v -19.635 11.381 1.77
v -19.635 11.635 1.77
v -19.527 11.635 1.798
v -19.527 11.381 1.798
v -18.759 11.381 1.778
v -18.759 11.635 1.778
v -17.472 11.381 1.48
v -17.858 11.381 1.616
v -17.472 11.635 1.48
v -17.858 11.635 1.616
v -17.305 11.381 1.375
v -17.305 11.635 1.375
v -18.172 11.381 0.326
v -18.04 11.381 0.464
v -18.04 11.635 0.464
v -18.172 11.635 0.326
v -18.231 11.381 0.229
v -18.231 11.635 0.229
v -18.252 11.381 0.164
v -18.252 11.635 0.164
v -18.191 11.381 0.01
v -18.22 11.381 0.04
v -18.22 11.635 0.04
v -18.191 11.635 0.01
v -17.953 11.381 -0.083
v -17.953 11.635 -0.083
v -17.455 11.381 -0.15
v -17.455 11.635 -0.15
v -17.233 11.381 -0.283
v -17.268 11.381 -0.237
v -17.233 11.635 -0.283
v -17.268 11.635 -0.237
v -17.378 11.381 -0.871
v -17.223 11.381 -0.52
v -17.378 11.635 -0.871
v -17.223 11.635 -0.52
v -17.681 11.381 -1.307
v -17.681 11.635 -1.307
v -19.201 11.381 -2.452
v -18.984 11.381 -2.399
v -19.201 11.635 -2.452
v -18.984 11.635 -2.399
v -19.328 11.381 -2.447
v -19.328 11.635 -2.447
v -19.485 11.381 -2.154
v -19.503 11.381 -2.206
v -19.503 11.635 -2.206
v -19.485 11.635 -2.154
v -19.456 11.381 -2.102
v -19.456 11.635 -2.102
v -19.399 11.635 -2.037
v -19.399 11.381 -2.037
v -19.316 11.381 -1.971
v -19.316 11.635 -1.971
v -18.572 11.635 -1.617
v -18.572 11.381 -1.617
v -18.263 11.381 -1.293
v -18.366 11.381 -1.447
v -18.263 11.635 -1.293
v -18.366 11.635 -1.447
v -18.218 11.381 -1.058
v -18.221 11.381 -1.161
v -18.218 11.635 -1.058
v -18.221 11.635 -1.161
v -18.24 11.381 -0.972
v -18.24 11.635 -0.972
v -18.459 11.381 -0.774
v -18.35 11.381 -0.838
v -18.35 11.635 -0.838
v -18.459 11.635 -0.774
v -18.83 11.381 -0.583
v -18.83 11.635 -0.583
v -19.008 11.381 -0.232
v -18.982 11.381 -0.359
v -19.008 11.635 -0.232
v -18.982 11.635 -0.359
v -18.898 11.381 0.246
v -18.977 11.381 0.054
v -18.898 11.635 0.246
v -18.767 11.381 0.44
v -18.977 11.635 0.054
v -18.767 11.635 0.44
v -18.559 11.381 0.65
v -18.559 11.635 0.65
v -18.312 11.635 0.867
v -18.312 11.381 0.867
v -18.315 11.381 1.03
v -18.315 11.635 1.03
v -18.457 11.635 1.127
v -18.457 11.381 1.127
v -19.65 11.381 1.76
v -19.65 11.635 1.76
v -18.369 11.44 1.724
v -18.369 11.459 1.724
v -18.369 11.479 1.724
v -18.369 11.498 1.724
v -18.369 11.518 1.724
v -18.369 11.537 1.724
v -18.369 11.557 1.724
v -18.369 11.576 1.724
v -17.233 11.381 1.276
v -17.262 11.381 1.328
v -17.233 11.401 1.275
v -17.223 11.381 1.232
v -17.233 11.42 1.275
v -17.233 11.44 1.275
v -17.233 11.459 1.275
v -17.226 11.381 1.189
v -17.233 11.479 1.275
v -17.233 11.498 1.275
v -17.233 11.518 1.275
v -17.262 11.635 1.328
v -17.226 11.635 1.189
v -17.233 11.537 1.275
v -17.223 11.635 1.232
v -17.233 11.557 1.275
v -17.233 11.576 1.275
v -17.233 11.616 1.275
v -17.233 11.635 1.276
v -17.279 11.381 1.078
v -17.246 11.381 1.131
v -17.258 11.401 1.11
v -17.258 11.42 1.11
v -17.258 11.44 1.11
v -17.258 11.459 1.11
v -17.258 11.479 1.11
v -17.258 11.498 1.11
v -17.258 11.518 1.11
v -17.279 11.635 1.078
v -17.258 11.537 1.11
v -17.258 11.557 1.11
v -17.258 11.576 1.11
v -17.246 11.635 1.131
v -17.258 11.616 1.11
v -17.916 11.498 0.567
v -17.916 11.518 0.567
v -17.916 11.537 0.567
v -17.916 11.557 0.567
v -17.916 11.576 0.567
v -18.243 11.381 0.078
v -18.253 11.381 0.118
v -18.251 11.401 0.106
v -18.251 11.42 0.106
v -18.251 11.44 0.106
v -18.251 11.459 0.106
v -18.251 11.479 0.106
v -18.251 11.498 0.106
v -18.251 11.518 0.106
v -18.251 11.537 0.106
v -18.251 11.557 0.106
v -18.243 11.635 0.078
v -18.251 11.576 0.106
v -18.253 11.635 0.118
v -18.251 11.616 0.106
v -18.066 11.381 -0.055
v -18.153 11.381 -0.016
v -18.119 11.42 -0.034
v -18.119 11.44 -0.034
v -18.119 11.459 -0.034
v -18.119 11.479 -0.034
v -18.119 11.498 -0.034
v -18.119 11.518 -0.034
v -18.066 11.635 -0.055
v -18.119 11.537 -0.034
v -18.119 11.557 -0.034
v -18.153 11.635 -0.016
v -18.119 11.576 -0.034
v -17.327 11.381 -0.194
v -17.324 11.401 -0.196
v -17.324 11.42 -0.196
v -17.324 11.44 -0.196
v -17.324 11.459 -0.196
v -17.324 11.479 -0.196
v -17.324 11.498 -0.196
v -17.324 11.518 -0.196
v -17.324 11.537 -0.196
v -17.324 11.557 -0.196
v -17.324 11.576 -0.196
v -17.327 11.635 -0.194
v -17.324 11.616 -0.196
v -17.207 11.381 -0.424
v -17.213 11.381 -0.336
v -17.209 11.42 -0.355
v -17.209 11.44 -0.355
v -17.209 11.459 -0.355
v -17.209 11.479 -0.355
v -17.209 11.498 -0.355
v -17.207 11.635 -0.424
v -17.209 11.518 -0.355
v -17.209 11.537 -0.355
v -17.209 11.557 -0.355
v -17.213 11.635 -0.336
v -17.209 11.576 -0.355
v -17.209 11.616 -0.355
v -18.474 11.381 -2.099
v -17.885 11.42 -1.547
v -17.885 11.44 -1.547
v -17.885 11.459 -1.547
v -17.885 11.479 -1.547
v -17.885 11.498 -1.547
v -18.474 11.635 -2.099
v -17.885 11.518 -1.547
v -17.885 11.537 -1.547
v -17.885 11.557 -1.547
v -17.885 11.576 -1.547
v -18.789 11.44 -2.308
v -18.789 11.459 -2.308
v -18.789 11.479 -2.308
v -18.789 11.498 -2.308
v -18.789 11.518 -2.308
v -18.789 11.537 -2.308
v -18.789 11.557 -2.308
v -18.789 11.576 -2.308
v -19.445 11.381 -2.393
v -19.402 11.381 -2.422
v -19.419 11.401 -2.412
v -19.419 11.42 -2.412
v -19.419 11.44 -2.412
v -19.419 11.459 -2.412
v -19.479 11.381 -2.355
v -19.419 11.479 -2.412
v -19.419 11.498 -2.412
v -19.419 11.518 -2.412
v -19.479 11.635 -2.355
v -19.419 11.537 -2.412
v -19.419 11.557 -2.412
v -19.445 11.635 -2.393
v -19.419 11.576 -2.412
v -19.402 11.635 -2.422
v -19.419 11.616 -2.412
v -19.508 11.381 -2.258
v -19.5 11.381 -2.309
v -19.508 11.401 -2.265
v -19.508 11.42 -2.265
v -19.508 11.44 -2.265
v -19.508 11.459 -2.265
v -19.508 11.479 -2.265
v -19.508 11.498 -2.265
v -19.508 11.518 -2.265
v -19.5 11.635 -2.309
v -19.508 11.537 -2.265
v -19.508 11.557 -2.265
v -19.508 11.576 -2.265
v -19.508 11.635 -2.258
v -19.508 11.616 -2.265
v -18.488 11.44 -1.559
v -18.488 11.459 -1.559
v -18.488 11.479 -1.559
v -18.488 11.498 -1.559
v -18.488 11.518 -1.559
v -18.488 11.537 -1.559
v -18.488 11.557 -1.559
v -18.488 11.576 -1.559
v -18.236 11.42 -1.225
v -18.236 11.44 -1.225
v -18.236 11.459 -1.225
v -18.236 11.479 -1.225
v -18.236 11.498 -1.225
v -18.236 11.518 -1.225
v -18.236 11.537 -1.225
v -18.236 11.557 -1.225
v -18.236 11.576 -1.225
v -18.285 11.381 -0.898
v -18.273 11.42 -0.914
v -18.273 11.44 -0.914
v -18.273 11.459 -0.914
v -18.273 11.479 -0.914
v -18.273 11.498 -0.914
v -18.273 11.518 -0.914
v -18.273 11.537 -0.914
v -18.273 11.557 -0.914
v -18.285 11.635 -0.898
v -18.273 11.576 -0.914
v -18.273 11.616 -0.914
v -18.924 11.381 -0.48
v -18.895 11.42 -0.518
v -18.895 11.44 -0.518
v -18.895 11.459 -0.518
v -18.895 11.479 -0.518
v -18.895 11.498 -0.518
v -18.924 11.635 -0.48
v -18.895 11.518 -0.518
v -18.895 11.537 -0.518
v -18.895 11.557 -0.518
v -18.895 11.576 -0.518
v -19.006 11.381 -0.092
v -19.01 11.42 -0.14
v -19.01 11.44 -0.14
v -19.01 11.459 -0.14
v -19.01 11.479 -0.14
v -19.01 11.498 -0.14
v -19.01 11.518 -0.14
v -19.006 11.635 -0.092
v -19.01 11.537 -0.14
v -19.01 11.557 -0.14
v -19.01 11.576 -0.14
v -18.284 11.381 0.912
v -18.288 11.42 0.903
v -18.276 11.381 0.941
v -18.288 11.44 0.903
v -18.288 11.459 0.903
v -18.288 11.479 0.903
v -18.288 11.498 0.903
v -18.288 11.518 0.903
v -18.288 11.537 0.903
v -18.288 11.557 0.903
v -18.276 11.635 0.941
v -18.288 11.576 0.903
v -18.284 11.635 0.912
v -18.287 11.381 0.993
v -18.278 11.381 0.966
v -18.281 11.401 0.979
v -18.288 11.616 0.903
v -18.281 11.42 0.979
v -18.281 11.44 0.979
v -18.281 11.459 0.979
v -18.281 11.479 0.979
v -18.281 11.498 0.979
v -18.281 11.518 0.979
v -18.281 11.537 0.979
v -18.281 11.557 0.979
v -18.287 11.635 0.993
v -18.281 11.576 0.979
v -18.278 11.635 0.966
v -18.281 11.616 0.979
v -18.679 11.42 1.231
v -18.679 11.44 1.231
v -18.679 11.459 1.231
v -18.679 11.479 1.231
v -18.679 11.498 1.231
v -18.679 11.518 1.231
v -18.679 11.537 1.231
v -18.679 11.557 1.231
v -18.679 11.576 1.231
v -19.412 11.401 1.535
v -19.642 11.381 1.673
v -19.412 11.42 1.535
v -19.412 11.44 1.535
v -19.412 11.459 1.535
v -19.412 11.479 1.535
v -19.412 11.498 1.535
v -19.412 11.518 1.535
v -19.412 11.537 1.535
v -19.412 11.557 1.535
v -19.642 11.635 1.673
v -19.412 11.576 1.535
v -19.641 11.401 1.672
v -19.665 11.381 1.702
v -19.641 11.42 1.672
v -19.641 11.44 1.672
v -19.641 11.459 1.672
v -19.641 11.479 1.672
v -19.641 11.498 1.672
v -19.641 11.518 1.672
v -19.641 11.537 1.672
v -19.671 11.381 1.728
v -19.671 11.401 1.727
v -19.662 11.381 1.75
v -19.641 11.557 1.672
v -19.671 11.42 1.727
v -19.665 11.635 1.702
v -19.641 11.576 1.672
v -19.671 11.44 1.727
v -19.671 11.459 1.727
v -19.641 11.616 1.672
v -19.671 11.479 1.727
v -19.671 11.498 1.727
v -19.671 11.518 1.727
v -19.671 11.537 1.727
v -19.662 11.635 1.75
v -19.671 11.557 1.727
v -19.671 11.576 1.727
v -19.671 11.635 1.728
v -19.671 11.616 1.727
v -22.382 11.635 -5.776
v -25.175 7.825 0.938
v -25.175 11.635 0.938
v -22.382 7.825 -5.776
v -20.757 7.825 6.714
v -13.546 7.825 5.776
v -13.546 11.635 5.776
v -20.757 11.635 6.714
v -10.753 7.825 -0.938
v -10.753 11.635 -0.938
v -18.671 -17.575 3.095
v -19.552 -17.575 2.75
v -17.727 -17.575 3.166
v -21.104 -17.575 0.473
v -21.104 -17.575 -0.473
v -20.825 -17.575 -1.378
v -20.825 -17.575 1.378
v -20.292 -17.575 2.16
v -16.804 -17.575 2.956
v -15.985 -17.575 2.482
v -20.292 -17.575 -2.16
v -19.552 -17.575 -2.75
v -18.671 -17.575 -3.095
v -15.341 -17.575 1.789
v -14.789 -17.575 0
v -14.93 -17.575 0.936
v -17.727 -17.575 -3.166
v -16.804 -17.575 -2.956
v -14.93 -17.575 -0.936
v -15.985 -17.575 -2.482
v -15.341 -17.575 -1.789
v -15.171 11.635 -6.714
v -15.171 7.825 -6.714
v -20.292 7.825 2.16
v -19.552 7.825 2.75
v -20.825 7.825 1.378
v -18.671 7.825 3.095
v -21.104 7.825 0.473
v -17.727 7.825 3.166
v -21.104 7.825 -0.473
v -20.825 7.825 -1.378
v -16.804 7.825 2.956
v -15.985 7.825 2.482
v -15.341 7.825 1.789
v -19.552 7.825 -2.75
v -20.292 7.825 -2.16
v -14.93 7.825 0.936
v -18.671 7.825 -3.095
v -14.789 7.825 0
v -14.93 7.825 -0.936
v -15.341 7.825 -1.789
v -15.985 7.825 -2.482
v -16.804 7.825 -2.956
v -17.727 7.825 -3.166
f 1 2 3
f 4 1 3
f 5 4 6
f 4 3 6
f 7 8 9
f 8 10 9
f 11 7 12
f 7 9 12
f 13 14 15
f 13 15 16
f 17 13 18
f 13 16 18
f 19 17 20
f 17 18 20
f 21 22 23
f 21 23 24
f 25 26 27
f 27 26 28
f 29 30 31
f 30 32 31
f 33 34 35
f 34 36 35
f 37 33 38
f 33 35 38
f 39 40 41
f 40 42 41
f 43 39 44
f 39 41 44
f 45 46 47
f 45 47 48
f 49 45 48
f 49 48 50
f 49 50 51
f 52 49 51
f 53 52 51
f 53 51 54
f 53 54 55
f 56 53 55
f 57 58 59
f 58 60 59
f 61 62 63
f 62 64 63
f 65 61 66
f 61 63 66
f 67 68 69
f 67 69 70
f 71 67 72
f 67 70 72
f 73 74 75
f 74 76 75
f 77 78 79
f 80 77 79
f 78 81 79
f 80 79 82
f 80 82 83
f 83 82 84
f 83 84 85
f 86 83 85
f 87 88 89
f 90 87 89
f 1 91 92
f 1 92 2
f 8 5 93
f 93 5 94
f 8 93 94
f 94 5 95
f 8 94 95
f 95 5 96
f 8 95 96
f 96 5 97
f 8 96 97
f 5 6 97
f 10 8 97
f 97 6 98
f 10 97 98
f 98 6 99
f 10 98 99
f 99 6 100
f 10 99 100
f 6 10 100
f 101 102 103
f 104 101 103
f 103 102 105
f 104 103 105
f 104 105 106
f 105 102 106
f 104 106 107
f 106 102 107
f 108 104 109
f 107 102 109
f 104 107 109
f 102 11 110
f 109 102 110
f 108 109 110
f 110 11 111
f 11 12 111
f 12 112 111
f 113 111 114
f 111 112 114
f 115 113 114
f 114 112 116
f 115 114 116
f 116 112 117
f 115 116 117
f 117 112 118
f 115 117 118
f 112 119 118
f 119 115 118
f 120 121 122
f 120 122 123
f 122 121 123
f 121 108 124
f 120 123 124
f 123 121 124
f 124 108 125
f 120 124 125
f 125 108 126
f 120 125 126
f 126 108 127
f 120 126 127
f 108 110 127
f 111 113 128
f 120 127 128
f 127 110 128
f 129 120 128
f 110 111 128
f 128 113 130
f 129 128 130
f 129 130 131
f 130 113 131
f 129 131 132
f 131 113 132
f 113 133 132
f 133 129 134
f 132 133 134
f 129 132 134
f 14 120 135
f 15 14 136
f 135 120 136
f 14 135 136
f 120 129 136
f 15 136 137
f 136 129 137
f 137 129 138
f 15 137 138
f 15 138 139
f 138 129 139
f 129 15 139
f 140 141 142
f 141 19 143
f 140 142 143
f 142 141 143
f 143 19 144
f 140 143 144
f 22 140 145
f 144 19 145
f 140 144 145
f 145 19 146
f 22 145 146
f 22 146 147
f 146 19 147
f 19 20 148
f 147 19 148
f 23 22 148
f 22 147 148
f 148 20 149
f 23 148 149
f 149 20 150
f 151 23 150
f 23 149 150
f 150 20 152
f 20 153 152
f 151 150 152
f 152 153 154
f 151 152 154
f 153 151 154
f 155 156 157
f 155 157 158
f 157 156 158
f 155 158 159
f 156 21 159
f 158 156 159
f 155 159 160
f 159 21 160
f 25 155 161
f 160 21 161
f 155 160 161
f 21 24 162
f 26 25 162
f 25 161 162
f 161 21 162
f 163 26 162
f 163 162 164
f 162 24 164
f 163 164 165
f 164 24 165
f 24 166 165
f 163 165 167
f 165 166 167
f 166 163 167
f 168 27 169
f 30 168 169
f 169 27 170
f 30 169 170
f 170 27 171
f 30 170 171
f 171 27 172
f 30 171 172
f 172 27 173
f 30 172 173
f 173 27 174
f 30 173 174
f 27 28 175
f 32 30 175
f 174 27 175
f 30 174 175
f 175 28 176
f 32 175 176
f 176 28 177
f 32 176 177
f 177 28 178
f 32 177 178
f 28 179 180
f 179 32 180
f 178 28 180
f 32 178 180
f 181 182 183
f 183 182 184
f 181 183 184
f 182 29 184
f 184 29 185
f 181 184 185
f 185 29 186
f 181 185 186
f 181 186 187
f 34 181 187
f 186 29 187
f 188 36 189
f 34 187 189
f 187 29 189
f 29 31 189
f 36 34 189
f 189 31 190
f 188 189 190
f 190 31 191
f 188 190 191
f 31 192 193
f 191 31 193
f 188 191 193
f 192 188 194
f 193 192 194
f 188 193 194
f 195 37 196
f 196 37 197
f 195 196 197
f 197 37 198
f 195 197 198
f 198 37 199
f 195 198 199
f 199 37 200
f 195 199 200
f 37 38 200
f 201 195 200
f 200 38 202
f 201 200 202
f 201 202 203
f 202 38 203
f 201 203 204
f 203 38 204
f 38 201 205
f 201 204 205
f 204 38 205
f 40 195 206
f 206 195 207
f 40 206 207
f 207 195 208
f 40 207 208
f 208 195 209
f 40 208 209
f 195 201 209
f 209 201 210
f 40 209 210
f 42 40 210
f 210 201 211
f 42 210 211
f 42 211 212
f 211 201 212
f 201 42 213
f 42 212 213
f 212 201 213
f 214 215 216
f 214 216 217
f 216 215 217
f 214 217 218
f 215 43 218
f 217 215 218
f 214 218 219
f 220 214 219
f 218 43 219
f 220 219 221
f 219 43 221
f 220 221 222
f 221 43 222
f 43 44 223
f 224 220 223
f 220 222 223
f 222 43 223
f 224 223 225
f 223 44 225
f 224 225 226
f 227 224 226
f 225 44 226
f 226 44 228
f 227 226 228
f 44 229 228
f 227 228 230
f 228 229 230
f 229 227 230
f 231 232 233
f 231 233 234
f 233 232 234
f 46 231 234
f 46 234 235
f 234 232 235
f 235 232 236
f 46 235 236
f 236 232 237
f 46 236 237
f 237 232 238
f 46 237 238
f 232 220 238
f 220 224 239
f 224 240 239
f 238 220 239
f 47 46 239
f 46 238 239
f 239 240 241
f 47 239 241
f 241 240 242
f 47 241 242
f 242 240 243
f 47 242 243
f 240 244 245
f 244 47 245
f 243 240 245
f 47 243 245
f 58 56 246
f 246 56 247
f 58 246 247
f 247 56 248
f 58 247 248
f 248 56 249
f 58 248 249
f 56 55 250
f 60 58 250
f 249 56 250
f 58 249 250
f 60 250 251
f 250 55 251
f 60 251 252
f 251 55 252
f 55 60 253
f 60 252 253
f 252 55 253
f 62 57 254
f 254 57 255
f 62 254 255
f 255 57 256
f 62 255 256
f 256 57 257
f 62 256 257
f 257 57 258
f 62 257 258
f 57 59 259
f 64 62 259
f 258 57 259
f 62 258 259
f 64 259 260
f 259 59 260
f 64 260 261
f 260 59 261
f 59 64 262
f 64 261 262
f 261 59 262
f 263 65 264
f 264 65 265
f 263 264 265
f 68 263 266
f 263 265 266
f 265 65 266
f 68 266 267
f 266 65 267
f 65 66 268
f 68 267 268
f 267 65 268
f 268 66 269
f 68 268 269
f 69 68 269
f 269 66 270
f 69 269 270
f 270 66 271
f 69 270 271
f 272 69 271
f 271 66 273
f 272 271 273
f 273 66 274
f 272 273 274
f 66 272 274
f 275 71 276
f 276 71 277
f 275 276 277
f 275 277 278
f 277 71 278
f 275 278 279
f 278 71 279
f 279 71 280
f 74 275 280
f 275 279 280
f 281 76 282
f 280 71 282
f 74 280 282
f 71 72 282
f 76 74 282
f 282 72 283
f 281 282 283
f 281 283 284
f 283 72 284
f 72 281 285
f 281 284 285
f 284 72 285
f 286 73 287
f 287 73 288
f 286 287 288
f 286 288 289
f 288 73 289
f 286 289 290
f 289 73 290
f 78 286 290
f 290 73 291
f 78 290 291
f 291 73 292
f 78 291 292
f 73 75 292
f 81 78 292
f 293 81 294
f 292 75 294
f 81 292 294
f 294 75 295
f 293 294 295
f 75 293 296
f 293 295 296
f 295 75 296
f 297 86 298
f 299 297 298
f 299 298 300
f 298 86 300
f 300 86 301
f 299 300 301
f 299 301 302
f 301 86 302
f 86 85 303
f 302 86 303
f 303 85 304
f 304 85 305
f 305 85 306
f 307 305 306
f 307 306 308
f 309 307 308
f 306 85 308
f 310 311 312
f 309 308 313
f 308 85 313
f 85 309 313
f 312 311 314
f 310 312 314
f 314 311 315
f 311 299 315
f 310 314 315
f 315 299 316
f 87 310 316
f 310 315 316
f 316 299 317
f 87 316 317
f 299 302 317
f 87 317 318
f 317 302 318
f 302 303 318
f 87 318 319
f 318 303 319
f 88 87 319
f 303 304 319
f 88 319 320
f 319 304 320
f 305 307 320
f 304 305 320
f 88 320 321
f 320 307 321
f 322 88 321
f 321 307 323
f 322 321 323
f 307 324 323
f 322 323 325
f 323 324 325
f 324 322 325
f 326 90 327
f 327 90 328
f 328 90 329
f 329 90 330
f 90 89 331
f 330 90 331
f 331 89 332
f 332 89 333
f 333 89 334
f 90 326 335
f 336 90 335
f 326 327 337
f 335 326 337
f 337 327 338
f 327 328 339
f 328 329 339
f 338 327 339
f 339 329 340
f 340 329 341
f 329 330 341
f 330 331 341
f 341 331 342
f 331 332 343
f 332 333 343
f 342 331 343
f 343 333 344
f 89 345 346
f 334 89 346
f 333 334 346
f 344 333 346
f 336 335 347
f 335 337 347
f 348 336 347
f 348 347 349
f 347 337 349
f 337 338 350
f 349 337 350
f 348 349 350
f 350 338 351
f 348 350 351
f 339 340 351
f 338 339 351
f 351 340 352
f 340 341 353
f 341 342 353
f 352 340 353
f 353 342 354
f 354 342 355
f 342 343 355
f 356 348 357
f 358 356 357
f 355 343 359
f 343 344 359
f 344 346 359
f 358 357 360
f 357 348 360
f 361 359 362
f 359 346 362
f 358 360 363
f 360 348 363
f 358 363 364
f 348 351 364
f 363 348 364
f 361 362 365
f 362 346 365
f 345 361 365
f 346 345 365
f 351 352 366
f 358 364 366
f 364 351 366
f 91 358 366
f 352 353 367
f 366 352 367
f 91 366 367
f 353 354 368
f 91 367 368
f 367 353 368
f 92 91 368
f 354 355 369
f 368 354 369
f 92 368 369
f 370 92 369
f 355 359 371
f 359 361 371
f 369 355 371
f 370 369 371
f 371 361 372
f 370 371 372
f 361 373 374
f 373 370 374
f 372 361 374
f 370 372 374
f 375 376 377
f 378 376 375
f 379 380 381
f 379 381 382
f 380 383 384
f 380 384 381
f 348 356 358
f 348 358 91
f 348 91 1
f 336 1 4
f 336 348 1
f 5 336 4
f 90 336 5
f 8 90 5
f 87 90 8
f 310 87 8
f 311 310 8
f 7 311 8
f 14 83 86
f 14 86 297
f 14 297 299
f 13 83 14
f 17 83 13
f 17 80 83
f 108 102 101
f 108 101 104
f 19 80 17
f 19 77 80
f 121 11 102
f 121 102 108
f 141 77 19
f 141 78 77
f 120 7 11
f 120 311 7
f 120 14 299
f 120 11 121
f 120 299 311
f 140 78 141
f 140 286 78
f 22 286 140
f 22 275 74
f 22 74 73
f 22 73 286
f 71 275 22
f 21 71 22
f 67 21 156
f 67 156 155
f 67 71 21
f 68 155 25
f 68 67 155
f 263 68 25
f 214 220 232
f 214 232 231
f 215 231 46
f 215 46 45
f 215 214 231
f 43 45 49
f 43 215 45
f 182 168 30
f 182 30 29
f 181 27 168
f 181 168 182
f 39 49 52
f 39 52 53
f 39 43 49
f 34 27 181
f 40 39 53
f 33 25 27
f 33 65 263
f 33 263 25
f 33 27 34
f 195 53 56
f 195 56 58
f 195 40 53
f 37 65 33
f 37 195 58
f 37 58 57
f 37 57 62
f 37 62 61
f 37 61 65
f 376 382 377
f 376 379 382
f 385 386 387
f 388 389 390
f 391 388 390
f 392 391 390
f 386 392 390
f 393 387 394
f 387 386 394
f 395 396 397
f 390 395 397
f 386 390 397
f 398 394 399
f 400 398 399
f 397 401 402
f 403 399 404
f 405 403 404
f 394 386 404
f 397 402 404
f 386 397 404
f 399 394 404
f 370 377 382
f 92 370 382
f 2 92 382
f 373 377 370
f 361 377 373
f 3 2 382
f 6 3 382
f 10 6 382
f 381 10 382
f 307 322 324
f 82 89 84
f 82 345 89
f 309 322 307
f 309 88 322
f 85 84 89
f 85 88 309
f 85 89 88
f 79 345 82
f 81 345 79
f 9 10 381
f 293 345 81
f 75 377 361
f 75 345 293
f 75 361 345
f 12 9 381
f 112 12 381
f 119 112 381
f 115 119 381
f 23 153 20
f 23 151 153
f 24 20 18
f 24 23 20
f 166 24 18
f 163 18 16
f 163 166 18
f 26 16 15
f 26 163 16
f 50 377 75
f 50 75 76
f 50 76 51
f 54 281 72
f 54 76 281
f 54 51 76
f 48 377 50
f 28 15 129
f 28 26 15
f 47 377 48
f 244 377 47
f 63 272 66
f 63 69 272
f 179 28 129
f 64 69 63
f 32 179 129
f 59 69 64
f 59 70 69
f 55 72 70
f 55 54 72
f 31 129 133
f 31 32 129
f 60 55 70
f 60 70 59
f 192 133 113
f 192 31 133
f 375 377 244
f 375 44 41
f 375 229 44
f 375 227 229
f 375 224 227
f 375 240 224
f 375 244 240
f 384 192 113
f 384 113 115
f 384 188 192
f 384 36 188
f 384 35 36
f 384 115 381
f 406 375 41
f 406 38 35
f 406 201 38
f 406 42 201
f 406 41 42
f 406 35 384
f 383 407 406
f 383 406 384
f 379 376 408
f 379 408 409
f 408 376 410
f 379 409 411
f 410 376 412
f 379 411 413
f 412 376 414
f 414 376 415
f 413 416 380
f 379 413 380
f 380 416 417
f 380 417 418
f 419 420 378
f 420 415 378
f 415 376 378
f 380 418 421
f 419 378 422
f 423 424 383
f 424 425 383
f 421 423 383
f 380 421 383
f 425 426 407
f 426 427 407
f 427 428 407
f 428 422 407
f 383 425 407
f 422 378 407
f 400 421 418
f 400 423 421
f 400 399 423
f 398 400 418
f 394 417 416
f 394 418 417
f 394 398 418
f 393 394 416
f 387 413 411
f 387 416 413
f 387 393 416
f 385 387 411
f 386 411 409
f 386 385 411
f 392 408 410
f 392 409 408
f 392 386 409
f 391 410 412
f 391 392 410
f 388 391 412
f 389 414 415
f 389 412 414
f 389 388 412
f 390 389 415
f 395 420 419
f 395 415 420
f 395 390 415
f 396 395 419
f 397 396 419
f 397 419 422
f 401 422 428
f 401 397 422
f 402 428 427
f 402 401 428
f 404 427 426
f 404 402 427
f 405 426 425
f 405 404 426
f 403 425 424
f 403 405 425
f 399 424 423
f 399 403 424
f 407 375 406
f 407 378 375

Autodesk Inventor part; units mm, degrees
ref_plane "YZ Plane" through (0, 0, 0) normal (1, 0, 0) x (0, 1, 0)
ref_plane "XZ Plane" through (0, 0, 0) normal (0, 1, 0) x (-1, 0, 0)
ref_plane "XY Plane" through (0, 0, 0) normal (0, 0, 1) x (1, 0, 0)
sketch "Sketch1" plane through (0, 0, 0) normal (0, 0, 1) x (1, 0, 0)
  line L0 (-17.9641, 7.8251) -> (-14.7891, 7.8251)
  line L1 (-14.7891, 7.8251) -> (-14.7891, -17.5749)
  line L2 (-14.7891, -17.5749) -> (-17.9641, -17.5749)
  line L3 (-17.9641, -17.5749) -> (-17.9641, 7.8251)
  point P0 (0, 0)
  dimension "d0" = 3.175
  dimension "d1" = 25.4
revolve "Revolution1" add sketch "Sketch1" angle 360 about axis through (-17.9641, -17.5749, 0) along (0, 1, 0)
sketch "Sketch2" plane through (-17.9641, 7.8251, 0) normal (0, 1, 0) x (1, 0, 0)
  circle A0 centre (0, 0) radius 3.175 projected
  line L0 (-2.7933, -6.7141) -> (-7.2112, -0.938)
  line L1 (-7.2112, -0.938) -> (-4.418, 5.7761)
  line L2 (-4.418, 5.7761) -> (2.7933, 6.7141)
  line L3 (2.7933, 6.7141) -> (7.2112, 0.938)
  line L4 (7.2112, 0.938) -> (4.418, -5.7761)
  line L5 (4.418, -5.7761) -> (-2.7933, -6.7141)
  point P0 (17.9641, 0)
extrude "Extrusion1" add sketch "Sketch2" along normal blind 3.81 contours A0 | L0 L1 L2 L3 L4 L5
thread "Thread1" size "1/4-20 UNC" class "2A" standard "ANSI Unified Screw Threads" full length
sketch "Sketch3" plane through (-17.9641, 11.6351, 0) normal (0, 1, 0) x (1, 0, 0)
  spline S0 degree 5 poles (-1.6705, -1.7697) (-1.5087, -1.85) (-0.562, -1.832) (2.4108, -1.3359) (-1.0538, -0.5942) (-0.3082, 0.5963) (2.0933, -0.7076) (-1.4851, 3.8244) (-2.0876, 1.526) (-0.2865, 2.0954) (0.0858, 0.4541) (-1.2327, 0.9989) (-1.1868, -0.5585) (0.1138, -0.9114) (-0.367, -1.1465) (-1.6028, -1.5407) (-1.7853, -1.7128) (-1.6705, -1.7697) knots 0 0 0 0 0 0 0.118263 0.184405 0.277398 0.35545 0.432093 0.511849 0.589546 0.655005 0.725096 0.791185 0.859928 0.916088 1 1 1 1 1 1
  point P0 (17.9641, 0)
  point P1 (-0.2467, -0.2687)
  point P2 (-0.1215, 0.0477)
  point P3 (0.7392, 0.3)
  point P4 (-1.3859, 2.4418)
  point P5 (-1.4827, 2.0902)
  point P6 (-0.4576, 1.5038)
  point P7 (-0.3161, 0.9046)
  point P8 (-0.8855, 0.5658)
  point P9 (-0.8855, -0.3278)
  point P10 (-0.3187, -0.9153)
  point P11 (-0.8855, -1.3006)
extrude "Extrusion2" cut sketch "Sketch3" against normal blind 0.254
properties part number ".25 diameter 1'' bolt"
